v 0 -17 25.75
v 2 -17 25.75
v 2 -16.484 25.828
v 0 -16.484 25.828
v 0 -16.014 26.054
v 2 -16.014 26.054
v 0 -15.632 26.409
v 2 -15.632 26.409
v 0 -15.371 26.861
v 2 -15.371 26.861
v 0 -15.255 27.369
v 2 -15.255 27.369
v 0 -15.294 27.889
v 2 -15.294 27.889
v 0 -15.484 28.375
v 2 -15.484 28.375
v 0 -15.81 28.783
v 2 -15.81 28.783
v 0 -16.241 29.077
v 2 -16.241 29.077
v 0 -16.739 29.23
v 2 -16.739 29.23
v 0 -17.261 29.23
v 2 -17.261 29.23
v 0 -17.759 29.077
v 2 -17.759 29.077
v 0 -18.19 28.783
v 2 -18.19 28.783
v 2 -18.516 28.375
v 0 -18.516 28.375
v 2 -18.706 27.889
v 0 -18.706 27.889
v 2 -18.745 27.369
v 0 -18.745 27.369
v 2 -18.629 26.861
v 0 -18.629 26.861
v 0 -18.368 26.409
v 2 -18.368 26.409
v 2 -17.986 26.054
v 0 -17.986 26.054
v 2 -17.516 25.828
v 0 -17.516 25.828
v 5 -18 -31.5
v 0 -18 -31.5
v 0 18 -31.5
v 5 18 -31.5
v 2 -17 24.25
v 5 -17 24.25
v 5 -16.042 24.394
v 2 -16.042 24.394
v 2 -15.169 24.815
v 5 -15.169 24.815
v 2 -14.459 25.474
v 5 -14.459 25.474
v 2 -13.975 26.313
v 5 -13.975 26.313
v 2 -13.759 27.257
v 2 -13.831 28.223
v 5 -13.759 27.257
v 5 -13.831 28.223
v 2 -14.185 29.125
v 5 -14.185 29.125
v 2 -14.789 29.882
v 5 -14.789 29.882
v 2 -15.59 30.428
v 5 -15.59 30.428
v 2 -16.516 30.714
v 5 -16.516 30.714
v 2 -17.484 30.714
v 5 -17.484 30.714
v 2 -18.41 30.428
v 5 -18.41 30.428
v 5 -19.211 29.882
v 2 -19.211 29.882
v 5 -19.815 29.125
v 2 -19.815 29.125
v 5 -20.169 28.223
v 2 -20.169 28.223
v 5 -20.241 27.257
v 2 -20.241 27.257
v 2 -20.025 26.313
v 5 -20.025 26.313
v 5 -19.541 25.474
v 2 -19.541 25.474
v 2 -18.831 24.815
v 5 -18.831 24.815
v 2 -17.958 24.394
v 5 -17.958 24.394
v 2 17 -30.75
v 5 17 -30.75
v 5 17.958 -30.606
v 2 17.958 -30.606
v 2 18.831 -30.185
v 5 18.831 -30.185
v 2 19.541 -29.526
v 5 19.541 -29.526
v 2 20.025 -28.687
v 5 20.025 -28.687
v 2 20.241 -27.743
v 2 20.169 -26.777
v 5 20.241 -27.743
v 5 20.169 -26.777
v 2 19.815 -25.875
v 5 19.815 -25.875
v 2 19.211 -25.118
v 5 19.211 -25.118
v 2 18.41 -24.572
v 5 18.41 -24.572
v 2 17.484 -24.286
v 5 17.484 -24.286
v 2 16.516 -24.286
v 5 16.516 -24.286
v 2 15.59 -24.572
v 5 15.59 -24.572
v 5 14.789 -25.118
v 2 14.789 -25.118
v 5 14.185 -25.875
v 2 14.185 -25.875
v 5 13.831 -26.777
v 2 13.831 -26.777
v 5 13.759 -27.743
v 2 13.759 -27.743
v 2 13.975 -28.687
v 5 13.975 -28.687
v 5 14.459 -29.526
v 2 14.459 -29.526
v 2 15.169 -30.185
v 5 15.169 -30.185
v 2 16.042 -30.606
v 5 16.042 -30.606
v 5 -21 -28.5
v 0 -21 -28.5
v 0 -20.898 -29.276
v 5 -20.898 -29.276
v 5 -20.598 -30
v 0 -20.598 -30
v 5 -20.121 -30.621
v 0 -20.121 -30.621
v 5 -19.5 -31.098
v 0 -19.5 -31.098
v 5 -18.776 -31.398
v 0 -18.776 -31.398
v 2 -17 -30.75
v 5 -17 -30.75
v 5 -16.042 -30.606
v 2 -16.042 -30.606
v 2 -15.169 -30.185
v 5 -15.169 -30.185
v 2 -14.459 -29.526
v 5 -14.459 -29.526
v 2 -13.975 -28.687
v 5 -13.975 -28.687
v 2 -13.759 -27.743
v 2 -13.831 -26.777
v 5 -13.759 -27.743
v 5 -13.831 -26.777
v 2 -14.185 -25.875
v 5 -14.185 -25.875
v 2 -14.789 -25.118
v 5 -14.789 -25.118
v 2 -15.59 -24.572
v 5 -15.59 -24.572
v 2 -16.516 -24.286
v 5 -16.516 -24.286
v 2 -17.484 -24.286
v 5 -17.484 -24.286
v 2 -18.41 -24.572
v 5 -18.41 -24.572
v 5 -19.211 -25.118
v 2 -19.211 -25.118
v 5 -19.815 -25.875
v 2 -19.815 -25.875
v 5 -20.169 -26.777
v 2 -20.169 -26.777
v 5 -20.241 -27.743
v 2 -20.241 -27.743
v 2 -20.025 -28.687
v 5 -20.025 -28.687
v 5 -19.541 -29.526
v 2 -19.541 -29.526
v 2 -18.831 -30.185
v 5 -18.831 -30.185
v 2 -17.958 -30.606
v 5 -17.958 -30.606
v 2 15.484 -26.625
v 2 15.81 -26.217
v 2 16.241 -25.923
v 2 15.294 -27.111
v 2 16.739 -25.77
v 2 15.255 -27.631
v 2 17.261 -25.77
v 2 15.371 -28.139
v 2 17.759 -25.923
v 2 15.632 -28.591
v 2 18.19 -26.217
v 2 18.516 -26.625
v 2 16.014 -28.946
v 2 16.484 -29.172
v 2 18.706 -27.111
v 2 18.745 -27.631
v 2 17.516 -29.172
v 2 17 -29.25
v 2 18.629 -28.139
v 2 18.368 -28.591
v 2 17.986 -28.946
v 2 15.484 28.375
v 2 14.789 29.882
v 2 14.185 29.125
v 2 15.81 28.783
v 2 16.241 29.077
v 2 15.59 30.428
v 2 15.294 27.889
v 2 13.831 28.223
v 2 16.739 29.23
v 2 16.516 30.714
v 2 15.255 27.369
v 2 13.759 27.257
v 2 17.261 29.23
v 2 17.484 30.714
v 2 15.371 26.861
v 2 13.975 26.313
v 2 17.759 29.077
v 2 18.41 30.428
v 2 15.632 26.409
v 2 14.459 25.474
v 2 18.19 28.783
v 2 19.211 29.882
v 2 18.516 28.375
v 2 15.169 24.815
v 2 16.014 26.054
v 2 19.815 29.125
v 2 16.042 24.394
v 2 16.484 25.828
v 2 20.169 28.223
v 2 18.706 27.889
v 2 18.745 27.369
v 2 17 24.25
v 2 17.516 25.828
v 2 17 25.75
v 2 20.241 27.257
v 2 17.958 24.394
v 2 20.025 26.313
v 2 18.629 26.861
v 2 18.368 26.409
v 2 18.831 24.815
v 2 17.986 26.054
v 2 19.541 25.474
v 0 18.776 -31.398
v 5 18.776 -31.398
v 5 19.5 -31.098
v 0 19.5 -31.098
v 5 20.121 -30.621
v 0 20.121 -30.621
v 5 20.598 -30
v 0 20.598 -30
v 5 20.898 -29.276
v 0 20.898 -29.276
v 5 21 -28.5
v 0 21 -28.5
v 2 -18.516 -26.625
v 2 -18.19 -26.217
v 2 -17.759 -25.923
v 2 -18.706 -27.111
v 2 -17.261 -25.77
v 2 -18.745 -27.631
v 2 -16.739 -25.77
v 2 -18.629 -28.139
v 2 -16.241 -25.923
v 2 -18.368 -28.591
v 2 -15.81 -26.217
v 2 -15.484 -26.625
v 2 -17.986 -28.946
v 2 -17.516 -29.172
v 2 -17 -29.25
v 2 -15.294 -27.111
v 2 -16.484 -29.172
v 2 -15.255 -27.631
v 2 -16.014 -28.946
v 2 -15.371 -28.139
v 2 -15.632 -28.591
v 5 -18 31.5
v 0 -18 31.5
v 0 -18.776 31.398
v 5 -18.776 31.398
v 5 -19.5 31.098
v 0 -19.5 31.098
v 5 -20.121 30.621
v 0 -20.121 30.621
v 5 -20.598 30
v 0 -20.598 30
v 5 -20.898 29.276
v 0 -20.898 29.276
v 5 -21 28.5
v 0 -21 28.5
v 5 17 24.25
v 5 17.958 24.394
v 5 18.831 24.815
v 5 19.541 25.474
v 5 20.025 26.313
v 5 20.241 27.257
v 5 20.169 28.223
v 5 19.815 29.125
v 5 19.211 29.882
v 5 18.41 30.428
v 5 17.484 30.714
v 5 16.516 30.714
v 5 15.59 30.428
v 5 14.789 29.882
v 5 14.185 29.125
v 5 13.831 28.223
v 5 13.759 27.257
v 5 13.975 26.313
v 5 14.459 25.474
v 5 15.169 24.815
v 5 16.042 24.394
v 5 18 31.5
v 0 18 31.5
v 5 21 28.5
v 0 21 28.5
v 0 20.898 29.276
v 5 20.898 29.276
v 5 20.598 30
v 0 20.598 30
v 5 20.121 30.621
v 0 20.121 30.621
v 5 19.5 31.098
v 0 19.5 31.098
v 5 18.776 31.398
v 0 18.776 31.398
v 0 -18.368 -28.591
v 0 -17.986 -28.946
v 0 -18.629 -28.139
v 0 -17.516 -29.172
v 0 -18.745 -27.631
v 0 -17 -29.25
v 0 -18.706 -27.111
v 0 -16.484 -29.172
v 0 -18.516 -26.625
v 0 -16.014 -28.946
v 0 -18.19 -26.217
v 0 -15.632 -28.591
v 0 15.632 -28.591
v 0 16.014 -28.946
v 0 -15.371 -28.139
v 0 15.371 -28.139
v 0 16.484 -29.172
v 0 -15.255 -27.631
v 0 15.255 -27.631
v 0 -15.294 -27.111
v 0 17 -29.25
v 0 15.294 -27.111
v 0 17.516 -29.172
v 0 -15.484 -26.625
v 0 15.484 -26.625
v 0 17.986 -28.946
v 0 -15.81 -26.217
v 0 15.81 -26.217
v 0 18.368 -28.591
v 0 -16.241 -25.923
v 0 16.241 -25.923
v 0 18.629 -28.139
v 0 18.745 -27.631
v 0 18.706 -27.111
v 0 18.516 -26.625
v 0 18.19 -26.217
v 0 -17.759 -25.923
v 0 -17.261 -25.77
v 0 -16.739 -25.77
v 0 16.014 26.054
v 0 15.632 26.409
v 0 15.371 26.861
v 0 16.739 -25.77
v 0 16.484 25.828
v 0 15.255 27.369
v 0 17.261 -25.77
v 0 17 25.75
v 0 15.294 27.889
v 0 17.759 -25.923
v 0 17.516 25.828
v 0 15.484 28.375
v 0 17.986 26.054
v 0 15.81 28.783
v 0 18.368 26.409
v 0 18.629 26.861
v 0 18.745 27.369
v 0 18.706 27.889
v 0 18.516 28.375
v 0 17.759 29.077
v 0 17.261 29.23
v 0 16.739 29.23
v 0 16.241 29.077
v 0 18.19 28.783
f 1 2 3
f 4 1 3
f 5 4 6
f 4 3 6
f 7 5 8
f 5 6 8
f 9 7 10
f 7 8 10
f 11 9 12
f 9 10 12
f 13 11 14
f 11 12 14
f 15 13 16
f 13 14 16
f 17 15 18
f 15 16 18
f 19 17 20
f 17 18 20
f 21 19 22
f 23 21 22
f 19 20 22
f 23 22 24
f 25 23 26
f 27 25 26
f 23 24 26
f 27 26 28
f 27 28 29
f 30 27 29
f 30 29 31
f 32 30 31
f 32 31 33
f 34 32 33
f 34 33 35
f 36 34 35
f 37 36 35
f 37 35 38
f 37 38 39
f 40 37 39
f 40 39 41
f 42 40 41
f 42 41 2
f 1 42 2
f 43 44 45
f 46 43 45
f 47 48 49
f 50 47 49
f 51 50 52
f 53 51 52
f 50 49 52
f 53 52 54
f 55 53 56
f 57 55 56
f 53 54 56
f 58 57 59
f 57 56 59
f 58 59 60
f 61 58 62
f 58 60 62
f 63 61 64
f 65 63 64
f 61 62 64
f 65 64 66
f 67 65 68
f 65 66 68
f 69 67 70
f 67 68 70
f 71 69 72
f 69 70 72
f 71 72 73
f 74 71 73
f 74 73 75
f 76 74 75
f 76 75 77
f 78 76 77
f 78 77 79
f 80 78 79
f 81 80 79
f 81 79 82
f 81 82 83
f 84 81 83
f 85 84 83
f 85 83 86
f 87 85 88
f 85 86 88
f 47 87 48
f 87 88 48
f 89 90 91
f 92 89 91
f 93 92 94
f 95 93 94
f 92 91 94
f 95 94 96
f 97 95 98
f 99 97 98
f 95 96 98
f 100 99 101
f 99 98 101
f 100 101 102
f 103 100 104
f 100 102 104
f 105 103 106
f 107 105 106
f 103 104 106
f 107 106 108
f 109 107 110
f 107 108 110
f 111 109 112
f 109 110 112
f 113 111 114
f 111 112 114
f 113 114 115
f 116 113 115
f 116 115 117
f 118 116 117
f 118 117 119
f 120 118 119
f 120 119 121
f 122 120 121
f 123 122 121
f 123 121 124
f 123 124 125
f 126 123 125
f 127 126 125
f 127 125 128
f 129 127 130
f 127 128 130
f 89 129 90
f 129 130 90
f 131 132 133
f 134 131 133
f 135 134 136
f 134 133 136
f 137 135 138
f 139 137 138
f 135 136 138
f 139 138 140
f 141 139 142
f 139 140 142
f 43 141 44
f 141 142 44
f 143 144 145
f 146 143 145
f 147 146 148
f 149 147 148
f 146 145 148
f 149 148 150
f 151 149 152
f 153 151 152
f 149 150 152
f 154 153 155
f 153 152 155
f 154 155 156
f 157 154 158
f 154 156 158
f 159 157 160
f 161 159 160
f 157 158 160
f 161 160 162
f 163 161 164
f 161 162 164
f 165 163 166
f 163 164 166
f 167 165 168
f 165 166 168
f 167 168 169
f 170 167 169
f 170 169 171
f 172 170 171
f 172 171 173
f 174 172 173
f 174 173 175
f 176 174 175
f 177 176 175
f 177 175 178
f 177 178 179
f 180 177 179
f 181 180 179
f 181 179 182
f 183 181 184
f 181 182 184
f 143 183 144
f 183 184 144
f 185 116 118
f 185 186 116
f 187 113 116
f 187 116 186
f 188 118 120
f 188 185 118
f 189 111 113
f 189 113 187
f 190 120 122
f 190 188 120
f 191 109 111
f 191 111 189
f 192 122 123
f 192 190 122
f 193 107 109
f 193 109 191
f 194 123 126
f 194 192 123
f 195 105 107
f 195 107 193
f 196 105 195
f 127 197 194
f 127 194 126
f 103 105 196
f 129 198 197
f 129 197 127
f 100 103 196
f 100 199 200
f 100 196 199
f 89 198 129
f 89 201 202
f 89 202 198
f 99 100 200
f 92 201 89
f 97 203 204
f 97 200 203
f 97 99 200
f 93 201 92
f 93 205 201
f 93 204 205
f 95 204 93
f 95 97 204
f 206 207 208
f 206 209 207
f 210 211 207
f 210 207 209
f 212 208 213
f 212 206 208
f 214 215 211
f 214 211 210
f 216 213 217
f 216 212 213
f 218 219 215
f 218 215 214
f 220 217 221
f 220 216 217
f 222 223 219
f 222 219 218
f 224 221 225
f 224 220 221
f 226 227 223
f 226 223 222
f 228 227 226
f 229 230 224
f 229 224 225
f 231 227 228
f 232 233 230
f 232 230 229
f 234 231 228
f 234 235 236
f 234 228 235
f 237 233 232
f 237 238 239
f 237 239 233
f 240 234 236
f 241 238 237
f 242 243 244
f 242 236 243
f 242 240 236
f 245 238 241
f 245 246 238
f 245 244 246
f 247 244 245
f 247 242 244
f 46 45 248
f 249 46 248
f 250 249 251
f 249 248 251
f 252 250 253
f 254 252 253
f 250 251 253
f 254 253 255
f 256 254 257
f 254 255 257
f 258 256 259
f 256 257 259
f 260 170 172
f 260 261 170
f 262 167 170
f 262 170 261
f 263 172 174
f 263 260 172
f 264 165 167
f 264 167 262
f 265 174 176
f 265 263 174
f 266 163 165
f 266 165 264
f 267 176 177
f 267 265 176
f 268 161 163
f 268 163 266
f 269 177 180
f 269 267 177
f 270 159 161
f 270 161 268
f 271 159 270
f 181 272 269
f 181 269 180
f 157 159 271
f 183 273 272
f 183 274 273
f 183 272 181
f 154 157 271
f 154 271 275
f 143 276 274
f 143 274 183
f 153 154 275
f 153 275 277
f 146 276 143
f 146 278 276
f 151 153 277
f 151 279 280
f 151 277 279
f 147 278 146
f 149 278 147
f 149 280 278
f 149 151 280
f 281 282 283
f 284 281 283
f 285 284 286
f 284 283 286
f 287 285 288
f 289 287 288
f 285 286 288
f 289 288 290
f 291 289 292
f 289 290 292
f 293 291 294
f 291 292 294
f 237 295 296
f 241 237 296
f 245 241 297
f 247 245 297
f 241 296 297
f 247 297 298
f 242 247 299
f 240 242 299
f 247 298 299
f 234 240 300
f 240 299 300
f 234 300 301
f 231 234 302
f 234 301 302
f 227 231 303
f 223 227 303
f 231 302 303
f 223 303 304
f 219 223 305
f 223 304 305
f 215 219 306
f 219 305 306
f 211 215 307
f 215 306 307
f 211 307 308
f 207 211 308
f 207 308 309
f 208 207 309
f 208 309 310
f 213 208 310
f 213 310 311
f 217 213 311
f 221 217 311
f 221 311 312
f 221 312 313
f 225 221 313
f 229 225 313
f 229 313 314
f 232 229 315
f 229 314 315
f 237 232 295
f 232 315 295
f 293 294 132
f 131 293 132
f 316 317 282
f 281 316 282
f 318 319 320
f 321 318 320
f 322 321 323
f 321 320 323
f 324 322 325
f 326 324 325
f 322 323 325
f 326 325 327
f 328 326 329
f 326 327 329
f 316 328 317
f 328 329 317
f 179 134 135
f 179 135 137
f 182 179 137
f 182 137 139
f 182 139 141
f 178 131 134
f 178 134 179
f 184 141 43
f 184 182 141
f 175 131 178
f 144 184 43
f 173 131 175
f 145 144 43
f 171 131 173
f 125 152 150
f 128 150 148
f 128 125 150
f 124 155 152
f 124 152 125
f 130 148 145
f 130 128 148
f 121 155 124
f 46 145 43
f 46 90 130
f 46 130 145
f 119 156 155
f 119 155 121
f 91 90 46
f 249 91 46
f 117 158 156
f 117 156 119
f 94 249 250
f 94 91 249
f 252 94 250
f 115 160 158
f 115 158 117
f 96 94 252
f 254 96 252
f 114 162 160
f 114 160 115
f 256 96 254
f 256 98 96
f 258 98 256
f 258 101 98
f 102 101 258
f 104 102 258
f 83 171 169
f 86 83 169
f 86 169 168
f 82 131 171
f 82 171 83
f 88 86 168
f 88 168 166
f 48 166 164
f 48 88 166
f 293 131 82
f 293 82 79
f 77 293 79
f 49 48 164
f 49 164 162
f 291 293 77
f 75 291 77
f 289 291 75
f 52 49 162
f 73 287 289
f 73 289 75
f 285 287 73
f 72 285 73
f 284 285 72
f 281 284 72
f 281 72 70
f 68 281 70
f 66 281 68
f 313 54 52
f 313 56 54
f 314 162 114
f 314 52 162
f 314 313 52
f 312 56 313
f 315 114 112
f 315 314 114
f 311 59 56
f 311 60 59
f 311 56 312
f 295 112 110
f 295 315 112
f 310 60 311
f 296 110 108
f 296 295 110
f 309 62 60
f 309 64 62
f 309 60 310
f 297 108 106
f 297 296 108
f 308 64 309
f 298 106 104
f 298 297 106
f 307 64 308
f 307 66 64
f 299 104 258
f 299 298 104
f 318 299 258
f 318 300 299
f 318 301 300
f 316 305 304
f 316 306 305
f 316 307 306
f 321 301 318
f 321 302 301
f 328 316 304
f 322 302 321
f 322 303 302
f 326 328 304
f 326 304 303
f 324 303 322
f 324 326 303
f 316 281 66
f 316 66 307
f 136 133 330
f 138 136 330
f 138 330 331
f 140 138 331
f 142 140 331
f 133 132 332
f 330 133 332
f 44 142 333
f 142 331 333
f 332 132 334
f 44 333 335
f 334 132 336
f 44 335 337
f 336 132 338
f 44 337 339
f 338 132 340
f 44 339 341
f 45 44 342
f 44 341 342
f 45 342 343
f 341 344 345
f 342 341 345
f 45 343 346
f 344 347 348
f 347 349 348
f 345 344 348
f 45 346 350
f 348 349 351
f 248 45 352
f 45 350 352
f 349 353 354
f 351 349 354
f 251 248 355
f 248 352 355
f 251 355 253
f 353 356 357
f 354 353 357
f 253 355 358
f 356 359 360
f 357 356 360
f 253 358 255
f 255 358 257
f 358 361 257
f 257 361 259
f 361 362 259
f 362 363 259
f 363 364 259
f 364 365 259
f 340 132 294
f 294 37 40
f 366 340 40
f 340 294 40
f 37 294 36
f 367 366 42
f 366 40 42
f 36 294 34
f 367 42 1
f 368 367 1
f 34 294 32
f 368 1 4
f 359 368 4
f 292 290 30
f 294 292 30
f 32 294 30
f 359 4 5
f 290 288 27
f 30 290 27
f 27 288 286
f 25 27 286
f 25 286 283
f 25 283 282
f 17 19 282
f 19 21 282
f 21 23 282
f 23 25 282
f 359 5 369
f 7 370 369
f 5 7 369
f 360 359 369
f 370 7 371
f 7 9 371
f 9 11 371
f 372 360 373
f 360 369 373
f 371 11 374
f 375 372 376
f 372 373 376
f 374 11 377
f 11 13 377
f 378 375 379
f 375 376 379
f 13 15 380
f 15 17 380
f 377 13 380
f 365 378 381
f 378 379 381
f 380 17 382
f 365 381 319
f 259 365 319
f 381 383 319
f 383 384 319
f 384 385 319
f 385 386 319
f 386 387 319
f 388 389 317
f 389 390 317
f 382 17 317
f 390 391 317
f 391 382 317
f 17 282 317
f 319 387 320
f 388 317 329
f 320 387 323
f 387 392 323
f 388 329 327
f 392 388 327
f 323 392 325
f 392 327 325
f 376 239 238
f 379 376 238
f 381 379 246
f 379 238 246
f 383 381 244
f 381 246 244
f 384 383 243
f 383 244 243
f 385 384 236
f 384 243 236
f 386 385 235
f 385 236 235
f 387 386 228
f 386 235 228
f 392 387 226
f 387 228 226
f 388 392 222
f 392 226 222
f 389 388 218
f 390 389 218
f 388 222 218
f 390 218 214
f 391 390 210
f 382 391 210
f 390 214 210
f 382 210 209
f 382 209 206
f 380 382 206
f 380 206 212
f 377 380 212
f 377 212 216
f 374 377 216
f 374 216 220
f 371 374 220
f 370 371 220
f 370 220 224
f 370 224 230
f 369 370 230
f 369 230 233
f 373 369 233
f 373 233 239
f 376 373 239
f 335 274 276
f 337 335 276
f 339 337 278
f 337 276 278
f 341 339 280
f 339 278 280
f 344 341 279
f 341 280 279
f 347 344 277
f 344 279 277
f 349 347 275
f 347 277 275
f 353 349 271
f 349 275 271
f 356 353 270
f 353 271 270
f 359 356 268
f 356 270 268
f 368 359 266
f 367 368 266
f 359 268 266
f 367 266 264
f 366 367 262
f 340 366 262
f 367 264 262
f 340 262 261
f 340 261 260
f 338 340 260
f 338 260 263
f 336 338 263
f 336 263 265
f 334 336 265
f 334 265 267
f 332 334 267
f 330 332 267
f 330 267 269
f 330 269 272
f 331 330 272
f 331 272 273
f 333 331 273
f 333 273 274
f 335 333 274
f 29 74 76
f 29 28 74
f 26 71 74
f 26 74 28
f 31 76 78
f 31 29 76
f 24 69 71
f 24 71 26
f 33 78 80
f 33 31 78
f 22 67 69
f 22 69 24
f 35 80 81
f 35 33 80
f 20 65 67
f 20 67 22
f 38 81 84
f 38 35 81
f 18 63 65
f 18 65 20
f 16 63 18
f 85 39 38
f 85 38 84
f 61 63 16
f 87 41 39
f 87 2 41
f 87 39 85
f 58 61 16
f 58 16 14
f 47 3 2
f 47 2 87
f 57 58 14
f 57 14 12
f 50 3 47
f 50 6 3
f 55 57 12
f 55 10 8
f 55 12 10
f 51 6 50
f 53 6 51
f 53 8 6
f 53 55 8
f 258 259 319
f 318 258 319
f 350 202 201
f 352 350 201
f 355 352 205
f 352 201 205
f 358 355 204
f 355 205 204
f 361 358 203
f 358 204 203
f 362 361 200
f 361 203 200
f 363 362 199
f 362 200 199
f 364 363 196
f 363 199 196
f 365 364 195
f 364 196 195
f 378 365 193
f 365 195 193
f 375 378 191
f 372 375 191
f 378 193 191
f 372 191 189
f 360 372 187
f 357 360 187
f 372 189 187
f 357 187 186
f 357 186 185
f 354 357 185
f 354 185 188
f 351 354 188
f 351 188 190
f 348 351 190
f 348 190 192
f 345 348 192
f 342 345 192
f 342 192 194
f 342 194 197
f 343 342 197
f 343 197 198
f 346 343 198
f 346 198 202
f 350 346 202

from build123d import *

# Parameters (mm, degrees)
BOSS_EXTRUDE1_DEPTH = 5
SKETCH2_R           = 1.75
CUT_EXTRUDE1_DEPTH  = 39.187039686
SKETCH3_R           = 3.25
CUT_EXTRUDE2_DEPTH  = 3


with BuildPart() as part:
    # Sketch1 → Boss-Extrude1 (new body)
    with BuildSketch(Plane.YZ):
        with BuildLine():
            Line((-18, -31.5), (18, -31.5))
            ThreePointArc((18, -31.5), (20.121320344, -30.621320344), (21, -28.5))
            Line((21, -28.5), (21, 28.5))
            ThreePointArc((21, 28.5), (20.121320344, 30.621320344), (18, 31.5))
            Line((18, 31.5), (-18, 31.5))
            ThreePointArc((-18, 31.5), (-20.121320344, 30.621320344), (-21, 28.5))
            Line((-21, 28.5), (-21, -28.5))
            ThreePointArc((-21, -28.5), (-20.121320344, -30.621320344), (-18, -31.5))
        make_face()
    extrude(amount=BOSS_EXTRUDE1_DEPTH)

    # Sketch2 → Cut-Extrude1 (cut, through all)
    with BuildSketch(Plane.YZ.offset(5)):
        with Locations(Location((-17, 27.5, 0), (0, 0, 270))):
            Circle(SKETCH2_R)
        with Locations(Location((17, 27.5, 0), (0, 0, 270))):
            Circle(SKETCH2_R)
        with Locations(Location((17, -27.5, 0), (0, 0, 270))):
            Circle(SKETCH2_R)
        with Locations(Location((-17, -27.5, 0), (0, 0, 270))):
            Circle(SKETCH2_R)
    extrude(amount=-CUT_EXTRUDE1_DEPTH, mode=Mode.SUBTRACT)

    # Sketch3 → Cut-Extrude2 (cut)
    with BuildSketch(Plane.YZ.offset(5)):
        with Locations(Location((17, 27.5, 0), (0, 0, 270))):
            Circle(SKETCH3_R)
        with Locations(Location((-17, 27.5, 0), (0, 0, 270))):
            Circle(SKETCH3_R)
        with Locations(Location((17, -27.5, 0), (0, 0, 270))):
            Circle(SKETCH3_R)
        with Locations(Location((-17, -27.5, 0), (0, 0, 270))):
            Circle(SKETCH3_R)
    extrude(amount=-CUT_EXTRUDE2_DEPTH, mode=Mode.SUBTRACT)


solid = part.part
